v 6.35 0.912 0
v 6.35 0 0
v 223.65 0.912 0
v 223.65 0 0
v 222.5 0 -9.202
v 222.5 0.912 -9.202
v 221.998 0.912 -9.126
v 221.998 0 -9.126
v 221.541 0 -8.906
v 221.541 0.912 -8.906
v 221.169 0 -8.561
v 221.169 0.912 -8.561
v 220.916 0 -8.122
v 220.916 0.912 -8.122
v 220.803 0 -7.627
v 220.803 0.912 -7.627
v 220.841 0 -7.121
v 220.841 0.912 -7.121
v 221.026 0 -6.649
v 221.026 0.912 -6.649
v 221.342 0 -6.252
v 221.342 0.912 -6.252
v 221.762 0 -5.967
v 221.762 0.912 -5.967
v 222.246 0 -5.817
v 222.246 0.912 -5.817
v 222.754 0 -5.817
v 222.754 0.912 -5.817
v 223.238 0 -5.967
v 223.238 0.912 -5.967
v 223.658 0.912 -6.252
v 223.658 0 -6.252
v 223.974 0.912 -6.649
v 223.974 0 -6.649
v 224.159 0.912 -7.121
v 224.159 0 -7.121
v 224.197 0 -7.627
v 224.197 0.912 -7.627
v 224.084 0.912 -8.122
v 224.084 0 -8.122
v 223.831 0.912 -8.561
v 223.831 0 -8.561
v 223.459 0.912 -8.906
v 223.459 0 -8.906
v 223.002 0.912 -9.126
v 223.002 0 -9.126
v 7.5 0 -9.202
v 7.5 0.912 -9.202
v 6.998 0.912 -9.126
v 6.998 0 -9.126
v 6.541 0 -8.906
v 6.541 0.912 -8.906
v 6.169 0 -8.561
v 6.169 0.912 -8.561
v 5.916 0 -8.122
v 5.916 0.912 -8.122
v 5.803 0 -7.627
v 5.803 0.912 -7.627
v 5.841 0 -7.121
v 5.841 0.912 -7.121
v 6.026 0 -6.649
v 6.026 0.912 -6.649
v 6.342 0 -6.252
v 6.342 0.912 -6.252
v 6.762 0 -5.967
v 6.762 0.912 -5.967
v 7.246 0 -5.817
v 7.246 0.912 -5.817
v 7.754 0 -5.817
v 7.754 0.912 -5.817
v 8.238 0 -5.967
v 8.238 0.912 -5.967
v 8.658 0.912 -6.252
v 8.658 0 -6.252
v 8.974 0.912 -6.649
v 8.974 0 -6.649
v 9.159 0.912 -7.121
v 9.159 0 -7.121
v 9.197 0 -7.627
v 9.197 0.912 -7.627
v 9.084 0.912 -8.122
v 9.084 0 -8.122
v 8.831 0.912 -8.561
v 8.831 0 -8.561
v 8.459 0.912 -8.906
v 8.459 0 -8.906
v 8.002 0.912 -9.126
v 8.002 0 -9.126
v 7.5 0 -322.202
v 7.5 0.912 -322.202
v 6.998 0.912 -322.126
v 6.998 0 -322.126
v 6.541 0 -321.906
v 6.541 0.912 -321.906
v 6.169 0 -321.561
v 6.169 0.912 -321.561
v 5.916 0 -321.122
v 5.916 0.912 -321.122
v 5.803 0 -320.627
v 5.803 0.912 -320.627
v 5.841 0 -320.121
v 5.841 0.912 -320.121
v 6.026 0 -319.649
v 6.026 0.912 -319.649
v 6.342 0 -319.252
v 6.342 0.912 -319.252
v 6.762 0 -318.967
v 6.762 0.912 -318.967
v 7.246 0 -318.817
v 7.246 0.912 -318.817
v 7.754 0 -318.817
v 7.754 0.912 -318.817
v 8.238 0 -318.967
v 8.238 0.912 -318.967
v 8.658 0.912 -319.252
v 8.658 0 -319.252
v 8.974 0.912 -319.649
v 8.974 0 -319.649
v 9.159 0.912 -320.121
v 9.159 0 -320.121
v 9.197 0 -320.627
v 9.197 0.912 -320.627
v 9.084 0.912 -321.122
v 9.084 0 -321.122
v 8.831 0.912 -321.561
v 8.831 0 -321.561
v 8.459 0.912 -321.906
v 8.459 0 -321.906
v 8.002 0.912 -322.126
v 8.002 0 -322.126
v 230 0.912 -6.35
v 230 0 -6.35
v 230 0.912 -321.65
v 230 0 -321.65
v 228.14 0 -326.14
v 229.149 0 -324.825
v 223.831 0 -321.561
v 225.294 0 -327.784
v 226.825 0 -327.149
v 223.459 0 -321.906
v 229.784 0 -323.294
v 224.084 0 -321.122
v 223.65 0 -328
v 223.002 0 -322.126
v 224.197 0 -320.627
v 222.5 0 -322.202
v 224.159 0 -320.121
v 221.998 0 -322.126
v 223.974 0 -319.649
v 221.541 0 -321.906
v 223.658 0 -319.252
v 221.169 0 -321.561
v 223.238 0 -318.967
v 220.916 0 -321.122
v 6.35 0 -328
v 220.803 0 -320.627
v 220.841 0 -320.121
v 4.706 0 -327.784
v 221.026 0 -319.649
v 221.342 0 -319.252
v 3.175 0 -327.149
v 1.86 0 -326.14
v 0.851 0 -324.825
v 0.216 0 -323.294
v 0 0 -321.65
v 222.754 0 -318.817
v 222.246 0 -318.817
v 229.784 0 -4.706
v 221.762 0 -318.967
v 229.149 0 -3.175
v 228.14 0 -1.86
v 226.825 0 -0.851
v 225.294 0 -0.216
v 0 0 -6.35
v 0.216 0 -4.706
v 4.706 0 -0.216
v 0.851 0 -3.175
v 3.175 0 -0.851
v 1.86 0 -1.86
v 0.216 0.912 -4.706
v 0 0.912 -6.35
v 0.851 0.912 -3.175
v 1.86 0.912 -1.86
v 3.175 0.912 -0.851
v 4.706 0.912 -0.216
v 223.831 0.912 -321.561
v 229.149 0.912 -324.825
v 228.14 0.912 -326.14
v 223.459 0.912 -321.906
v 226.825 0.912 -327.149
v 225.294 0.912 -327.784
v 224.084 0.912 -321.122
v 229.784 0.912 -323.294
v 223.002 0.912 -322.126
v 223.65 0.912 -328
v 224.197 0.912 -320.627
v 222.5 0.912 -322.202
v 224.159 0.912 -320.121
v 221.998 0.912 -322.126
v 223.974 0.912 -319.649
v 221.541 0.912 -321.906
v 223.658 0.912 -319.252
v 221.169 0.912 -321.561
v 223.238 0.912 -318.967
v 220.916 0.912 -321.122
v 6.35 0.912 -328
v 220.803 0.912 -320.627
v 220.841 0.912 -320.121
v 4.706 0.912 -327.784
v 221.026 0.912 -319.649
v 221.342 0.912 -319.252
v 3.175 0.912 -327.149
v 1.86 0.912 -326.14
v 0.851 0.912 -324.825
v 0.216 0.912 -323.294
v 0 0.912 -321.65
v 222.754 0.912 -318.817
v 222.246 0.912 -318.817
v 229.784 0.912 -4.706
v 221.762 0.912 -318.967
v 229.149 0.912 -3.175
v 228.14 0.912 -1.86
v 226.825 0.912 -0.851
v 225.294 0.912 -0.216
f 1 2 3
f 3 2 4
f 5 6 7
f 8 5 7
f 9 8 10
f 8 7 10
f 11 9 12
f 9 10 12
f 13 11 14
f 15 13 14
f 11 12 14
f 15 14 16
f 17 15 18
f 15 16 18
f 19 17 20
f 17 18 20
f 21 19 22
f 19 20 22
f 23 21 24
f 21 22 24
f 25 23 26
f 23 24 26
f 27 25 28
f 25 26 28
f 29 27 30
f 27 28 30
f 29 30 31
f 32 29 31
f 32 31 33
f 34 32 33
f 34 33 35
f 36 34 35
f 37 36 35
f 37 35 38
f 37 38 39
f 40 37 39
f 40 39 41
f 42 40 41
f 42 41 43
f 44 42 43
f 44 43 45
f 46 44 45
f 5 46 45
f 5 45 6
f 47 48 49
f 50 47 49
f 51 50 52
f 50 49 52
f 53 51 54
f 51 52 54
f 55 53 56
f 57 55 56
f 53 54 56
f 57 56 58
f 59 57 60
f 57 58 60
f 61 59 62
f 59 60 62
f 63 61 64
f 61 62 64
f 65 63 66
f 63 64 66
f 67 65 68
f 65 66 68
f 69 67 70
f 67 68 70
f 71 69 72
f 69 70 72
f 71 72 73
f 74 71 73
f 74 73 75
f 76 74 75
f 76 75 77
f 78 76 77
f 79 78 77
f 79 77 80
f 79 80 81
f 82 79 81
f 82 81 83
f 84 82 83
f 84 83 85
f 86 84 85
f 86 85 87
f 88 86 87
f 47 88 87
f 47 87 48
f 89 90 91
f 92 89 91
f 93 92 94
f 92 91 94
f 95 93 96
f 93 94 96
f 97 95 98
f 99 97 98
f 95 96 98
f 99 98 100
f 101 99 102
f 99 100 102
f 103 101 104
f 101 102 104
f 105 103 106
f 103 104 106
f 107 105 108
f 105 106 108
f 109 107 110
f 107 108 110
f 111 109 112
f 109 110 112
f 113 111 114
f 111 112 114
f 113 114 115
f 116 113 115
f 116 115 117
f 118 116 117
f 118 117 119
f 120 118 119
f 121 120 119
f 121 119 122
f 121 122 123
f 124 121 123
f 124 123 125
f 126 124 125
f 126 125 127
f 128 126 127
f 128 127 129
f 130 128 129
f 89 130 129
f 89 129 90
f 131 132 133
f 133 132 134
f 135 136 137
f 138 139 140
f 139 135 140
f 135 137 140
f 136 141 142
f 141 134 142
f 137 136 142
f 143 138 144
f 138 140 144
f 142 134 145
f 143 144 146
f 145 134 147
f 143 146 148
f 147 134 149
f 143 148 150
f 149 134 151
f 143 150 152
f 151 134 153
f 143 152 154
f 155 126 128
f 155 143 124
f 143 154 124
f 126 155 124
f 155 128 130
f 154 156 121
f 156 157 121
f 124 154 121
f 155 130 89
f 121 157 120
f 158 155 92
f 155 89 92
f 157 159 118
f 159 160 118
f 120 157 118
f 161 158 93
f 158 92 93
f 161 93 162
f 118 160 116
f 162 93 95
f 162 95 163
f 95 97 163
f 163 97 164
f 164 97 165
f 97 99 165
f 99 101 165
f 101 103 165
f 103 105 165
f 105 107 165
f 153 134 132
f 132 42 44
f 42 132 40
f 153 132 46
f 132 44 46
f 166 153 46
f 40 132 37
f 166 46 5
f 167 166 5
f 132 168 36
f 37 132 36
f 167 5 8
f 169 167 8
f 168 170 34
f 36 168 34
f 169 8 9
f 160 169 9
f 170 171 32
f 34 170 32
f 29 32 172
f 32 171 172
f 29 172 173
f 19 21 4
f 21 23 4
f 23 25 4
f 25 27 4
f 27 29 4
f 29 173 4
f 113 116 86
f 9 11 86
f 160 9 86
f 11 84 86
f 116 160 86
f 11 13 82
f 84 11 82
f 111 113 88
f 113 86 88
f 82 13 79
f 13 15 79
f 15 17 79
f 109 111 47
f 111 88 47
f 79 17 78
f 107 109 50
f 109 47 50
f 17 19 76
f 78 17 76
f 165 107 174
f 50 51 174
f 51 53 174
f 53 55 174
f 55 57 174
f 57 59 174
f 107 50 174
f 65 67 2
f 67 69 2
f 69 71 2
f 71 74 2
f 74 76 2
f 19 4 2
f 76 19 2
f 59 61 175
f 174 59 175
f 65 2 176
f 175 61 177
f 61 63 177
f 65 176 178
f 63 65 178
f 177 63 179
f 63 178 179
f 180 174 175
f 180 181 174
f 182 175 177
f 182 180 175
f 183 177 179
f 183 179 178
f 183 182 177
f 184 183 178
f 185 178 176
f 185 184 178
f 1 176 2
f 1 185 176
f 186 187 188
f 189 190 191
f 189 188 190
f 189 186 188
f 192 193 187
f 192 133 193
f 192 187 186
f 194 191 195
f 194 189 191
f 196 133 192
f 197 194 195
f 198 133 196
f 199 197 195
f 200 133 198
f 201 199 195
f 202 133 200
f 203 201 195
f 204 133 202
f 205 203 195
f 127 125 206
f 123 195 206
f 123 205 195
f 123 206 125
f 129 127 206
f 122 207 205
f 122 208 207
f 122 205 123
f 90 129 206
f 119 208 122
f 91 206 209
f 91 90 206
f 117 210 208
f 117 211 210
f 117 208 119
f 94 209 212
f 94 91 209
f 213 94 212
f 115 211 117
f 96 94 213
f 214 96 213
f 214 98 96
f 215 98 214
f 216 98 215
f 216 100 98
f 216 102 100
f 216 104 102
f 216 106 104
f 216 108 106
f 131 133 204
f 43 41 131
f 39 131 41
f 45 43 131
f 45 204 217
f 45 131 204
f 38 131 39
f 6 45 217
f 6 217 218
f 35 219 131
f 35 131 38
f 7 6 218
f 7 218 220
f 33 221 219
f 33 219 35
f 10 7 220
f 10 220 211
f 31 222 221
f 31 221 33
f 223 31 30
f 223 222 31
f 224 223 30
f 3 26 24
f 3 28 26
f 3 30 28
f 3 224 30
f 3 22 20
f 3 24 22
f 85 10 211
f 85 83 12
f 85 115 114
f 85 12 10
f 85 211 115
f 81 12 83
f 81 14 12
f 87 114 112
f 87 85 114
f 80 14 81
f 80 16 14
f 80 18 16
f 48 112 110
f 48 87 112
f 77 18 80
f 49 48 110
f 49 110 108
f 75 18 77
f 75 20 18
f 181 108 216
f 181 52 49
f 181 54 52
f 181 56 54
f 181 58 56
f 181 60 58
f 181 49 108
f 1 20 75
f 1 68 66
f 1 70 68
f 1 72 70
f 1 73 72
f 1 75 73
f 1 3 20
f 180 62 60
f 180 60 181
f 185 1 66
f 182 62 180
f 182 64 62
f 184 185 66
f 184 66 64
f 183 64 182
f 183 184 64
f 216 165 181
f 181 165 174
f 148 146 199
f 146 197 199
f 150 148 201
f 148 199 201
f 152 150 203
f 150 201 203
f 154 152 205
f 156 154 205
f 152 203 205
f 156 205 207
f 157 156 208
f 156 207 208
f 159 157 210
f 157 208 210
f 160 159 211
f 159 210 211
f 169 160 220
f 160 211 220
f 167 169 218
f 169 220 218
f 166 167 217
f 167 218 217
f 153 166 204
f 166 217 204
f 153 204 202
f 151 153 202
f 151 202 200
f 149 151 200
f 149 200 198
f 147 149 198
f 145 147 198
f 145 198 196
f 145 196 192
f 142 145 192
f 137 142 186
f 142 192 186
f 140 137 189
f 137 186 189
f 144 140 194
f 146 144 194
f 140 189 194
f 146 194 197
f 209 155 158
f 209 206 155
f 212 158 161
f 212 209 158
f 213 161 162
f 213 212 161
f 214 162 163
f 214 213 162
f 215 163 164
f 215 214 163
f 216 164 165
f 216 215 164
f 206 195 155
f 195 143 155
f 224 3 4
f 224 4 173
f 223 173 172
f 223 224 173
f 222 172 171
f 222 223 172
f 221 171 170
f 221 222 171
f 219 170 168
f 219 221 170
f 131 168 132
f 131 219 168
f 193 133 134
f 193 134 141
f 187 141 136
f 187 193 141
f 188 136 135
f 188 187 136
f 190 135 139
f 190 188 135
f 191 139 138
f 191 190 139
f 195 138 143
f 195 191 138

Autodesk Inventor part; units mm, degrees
ref_plane "YZ Plane" through (0, 0, 0) normal (1, 0, 0) x (0, 1, 0)
ref_plane "XZ Plane" through (0, 0, 0) normal (0, 1, 0) x (-1, 0, 0)
ref_plane "XY Plane" through (0, 0, 0) normal (0, 0, 1) x (1, 0, 0)
sketch "Sketch1" plane through (0, 0, 0) normal (0, 1, 0) x (-1, 0, 0)
  line L0 (0, 0) -> (-230, 0)
  line L1 (-230, 0) -> (-230, -328)
  line L2 (-230, -328) -> (0, -328)
  line L3 (0, -328) -> (0, 0)
  line L4 (-222.5, -7.5) -> (-7.5, -7.5) construction
  line L5 (-7.5, -7.5) -> (-7.5, -320.5) construction
  line L6 (-7.5, -320.5) -> (-222.5, -320.5) construction
  line L7 (-222.5, -320.5) -> (-222.5, -7.5) construction
  circle A0 centre (-7.5, -320.5) radius 1.6
  circle A1 centre (-222.5, -320.5) radius 1.6
  circle A2 centre (-222.5, -7.5) radius 1.6
  circle A3 centre (-7.5, -7.5) radius 1.6
  point P0 (-115, 0)
  dimension "d0" = 230
  dimension "d1" = 328
  dimension "d3" = 7.5
  dimension "d4" = 7.5
  dimension "d5" = 7.5
  dimension "d6" = 7.5
  dimension "d7" = 3.2
extrude "Plate1" add sketch "Sketch1" along normal blind 0.9119 contours L3 L2 L1 L0 | A0 | A1 | A2 | A3
hole "Hole1" at (222.5, 0, -320.5) at (7.5, 0, -320.5) at (7.5, 0, -7.5) at (222.5, 0, -7.5) direction (0, 1, 0) diameter 3.4036 end through all clearance for "Flat Head Machine Screw" size "M3" standard "Ansi Metric M Profile"
fillet "Corner Round1" radius 6.35 4 edges at (230, 0.4559, -328) (0, 0.4559, -328) (230, 0.4559, 0) (0, 0.4559, 0)
equation "\"d13\" = Thickness"
equation "\"d2\" = Thickness"
equation "\"BendRadius\" = Thickness"
equation "\"BendReliefWidth\" = Thickness"
equation "\"BendReliefDepth\" = 0.5 * Thickness"
equation "\"CornerReliefSize\" = 4 * Thickness"
equation "\"MinimumRemnant\" = 2 * Thickness"
equation "\"TransitionRadius\" = BendRadius"
equation "\"JacobiRadiusSize\" = BendRadius"
equation "\"GapSize\" = Thickness"
equation "\"Thickness\" = 0.91186"
properties part number "Side Panel" material "Steel, Carbon"
